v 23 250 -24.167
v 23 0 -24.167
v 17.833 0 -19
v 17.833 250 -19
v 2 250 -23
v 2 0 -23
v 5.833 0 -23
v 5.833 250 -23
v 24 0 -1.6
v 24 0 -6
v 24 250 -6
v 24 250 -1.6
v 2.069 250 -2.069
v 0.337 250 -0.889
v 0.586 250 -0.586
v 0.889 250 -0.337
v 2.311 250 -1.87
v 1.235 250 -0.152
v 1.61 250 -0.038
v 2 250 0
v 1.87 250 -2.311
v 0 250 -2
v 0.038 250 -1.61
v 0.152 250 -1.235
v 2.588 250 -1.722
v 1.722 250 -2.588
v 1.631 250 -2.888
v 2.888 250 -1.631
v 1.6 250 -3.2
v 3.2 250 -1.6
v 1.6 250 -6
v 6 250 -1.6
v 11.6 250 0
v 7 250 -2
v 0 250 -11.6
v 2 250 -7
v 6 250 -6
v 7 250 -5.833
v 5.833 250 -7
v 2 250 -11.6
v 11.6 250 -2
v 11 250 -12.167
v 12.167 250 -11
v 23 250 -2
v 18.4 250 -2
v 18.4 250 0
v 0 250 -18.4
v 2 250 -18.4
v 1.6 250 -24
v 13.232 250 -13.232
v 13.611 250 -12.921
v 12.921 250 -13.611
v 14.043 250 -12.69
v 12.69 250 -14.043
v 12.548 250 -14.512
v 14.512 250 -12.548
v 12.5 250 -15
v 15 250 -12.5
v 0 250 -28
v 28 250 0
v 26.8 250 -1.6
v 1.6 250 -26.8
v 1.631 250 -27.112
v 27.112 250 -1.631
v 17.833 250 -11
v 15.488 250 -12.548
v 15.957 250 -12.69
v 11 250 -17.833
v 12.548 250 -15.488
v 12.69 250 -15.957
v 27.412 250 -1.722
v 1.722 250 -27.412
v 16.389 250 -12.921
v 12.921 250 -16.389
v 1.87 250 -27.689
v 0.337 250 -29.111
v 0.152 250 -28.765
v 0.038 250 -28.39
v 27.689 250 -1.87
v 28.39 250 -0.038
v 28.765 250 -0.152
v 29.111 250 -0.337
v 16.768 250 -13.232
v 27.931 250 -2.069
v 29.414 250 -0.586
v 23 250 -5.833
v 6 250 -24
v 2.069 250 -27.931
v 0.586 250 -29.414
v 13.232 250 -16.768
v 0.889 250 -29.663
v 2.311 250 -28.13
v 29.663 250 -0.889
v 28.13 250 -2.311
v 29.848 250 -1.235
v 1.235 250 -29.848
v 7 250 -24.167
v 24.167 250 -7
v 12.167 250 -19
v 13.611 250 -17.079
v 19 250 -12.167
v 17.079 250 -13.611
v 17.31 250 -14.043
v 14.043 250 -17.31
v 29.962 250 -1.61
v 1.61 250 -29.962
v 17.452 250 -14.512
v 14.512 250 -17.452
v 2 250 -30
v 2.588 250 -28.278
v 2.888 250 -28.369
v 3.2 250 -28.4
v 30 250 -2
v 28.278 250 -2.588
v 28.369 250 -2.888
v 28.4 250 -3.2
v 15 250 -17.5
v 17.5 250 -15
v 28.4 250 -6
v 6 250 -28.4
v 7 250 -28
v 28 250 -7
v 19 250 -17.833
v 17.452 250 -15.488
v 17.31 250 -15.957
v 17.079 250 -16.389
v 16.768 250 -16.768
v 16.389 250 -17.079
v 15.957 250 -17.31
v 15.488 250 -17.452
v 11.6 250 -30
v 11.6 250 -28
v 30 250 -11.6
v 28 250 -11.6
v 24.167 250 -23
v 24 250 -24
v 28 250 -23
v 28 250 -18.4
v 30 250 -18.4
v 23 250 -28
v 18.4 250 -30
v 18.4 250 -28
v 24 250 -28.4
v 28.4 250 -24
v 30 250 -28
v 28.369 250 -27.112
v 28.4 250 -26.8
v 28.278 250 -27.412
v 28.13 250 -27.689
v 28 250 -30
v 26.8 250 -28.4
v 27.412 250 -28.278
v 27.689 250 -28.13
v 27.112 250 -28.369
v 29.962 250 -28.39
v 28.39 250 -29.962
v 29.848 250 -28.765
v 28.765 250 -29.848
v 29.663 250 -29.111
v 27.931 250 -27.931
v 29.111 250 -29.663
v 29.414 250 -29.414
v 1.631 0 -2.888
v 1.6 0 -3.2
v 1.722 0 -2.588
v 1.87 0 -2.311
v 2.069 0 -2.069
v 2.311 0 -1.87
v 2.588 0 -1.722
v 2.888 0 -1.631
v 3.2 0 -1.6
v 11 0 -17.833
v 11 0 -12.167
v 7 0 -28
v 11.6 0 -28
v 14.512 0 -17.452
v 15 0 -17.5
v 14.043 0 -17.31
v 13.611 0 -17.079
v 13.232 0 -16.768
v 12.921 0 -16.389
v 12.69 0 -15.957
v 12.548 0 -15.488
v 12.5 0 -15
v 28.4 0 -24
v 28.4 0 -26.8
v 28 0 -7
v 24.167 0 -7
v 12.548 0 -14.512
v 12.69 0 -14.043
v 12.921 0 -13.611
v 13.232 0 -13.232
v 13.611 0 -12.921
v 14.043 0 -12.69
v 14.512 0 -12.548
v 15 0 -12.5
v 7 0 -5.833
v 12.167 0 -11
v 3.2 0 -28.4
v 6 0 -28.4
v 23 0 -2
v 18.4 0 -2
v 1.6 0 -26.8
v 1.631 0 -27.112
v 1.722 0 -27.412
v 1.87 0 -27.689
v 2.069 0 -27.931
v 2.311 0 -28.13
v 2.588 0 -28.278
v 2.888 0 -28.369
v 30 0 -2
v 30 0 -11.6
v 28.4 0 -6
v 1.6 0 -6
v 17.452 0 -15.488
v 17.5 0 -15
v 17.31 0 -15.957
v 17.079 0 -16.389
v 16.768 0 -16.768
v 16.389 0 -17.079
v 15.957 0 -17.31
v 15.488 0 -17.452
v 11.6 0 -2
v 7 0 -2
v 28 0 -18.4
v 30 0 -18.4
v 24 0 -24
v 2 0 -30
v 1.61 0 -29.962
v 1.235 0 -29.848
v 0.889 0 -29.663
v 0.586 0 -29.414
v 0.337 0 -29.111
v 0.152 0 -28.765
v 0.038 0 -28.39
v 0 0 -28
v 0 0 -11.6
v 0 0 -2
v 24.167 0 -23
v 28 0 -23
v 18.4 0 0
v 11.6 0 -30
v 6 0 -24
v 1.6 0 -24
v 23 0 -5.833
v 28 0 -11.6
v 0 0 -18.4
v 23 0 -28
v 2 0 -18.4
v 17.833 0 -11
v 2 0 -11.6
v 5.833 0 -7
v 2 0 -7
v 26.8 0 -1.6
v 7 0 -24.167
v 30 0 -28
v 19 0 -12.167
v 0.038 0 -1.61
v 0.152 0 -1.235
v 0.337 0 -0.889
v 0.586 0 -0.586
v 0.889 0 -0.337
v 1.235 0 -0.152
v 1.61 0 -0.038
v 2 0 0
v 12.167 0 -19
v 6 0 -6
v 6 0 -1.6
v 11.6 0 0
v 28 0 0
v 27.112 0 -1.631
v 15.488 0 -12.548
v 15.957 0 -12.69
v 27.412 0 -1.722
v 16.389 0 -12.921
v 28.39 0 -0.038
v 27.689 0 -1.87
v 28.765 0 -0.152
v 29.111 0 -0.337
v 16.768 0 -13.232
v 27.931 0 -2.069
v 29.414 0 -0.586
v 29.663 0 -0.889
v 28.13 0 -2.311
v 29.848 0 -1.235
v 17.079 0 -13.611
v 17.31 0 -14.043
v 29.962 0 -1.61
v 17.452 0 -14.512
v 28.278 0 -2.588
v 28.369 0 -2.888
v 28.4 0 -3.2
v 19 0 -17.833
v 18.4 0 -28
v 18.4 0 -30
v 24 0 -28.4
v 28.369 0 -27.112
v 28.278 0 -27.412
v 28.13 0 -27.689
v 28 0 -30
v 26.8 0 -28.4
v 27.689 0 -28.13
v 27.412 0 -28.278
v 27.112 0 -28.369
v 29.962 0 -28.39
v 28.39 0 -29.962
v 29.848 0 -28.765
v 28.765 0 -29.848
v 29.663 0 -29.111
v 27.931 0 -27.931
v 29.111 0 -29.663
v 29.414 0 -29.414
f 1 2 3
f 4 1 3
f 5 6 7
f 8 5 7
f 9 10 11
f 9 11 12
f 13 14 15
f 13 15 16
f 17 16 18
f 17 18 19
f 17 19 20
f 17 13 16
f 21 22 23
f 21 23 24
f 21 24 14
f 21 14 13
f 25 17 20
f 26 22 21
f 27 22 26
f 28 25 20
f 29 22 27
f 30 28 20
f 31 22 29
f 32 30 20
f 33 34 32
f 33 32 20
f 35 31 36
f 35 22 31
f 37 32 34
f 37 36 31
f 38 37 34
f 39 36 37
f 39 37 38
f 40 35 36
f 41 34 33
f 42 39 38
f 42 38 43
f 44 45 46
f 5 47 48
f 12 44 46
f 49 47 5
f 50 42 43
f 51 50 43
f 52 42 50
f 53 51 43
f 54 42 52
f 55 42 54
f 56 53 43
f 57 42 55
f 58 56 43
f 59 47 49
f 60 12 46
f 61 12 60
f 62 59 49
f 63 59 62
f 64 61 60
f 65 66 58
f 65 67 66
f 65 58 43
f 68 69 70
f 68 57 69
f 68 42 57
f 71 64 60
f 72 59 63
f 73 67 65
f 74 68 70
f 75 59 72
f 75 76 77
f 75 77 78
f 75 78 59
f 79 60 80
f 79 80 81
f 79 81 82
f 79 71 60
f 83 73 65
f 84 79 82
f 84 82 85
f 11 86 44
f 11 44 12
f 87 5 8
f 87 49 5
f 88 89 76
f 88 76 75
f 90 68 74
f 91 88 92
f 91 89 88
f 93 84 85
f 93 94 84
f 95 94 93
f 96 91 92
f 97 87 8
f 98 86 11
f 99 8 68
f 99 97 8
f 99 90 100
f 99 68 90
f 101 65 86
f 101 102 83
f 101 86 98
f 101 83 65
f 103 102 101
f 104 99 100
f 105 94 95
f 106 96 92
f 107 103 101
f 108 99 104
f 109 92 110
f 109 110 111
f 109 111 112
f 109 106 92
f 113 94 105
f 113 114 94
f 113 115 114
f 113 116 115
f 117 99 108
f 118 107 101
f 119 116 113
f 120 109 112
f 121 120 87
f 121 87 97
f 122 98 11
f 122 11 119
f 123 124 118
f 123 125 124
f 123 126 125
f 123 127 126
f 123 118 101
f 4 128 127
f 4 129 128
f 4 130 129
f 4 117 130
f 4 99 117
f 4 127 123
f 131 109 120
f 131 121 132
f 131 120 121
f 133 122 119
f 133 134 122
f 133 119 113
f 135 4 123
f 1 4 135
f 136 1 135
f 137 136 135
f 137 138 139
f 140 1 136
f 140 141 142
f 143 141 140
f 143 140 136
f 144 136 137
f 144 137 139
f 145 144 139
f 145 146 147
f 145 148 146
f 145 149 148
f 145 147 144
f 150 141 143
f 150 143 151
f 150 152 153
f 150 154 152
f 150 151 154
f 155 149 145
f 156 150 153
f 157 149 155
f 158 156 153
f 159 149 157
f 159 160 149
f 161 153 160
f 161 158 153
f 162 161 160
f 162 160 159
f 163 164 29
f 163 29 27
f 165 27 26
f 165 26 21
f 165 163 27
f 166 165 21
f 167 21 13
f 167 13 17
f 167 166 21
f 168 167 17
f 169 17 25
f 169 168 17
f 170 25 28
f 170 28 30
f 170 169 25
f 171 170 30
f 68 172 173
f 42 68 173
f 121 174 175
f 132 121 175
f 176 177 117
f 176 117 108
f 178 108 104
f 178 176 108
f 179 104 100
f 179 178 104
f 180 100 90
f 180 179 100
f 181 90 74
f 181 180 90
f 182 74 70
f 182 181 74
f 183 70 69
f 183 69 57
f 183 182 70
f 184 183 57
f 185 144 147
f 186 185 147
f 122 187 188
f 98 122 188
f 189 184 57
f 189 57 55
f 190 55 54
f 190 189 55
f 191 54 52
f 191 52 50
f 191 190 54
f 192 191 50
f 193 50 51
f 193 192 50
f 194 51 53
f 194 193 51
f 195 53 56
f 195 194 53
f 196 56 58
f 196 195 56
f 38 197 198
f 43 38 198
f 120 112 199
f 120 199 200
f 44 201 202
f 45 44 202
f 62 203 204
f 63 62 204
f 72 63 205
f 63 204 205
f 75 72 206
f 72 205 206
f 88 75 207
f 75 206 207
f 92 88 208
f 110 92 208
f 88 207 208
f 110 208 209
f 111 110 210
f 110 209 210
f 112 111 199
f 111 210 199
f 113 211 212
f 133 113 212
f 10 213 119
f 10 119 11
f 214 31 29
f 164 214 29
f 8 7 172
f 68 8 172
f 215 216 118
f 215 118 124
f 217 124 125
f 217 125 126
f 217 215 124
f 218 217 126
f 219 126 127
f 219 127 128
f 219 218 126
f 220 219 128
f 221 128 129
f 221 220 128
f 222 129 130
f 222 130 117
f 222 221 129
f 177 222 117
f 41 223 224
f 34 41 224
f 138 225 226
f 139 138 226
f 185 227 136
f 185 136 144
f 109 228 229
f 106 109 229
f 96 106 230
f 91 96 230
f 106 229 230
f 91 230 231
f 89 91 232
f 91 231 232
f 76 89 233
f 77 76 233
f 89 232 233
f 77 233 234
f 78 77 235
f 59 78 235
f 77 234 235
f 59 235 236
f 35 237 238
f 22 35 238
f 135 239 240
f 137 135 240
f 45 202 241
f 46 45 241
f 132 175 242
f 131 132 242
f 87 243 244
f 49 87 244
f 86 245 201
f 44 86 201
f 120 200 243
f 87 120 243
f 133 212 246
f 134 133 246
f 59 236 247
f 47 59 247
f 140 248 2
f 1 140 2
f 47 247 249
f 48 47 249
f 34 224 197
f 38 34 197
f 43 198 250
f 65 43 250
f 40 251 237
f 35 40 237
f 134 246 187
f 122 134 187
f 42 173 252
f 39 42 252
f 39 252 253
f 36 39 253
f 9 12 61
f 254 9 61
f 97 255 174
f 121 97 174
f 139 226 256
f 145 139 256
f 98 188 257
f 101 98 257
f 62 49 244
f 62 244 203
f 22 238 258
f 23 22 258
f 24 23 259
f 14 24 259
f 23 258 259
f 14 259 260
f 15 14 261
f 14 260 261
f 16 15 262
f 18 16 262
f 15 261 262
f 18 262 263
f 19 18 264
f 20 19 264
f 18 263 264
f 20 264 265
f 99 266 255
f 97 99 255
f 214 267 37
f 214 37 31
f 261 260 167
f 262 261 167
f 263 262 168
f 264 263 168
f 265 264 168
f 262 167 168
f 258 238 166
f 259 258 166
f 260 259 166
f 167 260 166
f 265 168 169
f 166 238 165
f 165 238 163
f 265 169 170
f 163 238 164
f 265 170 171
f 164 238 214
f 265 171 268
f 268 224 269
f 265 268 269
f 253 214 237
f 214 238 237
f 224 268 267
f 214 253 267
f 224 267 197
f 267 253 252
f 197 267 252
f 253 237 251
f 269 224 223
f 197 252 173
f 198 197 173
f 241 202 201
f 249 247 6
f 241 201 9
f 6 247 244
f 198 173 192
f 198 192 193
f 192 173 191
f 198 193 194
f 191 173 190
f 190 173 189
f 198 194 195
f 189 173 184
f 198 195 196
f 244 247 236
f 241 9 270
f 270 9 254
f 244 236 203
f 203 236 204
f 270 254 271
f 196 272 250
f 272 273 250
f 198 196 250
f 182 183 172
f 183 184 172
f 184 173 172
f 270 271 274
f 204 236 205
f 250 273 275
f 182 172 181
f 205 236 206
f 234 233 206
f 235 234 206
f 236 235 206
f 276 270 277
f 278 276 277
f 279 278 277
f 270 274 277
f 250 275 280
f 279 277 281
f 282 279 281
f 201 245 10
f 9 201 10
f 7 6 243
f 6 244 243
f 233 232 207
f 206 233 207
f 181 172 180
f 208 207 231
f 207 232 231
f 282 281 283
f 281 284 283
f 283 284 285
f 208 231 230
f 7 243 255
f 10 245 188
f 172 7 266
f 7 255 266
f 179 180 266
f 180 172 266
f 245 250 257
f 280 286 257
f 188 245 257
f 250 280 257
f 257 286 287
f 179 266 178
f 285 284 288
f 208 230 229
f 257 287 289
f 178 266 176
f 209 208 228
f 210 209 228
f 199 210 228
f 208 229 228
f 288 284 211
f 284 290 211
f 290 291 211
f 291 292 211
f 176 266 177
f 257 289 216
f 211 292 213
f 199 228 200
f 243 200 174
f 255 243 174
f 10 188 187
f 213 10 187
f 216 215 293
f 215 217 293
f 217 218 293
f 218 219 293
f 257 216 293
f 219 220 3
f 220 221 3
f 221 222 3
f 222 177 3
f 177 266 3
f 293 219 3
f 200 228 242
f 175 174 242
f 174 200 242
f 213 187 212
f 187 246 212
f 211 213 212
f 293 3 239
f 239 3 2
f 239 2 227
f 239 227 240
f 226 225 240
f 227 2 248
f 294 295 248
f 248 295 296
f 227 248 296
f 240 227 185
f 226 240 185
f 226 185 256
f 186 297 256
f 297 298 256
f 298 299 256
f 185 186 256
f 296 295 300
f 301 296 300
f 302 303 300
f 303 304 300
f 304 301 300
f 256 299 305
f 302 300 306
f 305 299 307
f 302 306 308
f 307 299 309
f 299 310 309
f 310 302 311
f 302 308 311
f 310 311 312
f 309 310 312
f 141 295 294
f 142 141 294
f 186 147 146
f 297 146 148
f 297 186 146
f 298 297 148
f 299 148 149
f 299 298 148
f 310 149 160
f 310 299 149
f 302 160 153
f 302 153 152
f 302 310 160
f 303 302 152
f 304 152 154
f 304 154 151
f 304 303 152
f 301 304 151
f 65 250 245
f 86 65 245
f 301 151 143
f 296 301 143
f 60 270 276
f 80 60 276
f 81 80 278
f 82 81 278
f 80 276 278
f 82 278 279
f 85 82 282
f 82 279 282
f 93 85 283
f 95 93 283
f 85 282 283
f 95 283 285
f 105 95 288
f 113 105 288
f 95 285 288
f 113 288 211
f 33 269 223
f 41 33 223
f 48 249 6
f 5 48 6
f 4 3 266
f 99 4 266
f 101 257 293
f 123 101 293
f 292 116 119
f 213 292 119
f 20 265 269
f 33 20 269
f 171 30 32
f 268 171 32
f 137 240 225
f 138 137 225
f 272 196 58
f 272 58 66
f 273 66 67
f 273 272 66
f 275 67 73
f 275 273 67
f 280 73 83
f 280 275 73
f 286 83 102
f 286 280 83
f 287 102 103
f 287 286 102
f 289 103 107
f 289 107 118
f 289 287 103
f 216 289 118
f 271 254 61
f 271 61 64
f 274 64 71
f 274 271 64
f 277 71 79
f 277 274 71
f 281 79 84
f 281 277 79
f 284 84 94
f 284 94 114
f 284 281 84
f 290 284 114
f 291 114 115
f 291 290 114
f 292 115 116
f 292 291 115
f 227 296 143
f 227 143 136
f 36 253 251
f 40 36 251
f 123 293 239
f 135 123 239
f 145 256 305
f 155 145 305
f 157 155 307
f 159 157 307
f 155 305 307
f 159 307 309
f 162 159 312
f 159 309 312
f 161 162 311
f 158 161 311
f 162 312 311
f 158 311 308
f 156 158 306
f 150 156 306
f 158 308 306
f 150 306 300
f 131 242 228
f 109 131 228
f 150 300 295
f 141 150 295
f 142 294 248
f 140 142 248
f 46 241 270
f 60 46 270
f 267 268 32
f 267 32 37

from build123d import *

# Parameters (mm, degrees)
BOSS_EXTRUDE1_DEPTH = 250


with BuildPart() as part:
    # Sketch1 → Boss-Extrude1 (new body)
    with BuildSketch(Plane(origin=(0, 0, 0), x_dir=(1, 0, 0), z_dir=(0, 1, 0))):
        with BuildLine():
            Line((0, 28), (0, 18.4))
            Line((0, 18.4), (2, 18.4))
            Line((2, 18.4), (2, 23))
            Line((2, 23), (5.833273811, 23))
            Line((5.833273811, 23), (11, 17.833273811))
            Line((11, 17.833273811), (11, 15))
            Line((11, 15), (11, 12.166726189))
            Line((11, 12.166726189), (5.833273811, 7))
            Line((5.833273811, 7), (2, 7))
            Line((2, 7), (2, 11.6))
            Line((2, 11.6), (0, 11.6))
            Line((0, 11.6), (0, 2))
            ThreePointArc((0, 2), (0.585786438, 0.585786438), (2, 0))
            Line((2, 0), (11.6, 0))
            Line((11.6, 0), (11.6, 2))
            Line((11.6, 2), (7, 2))
            Line((7, 2), (7, 5.833273811))
            Line((7, 5.833273811), (12.166726189, 11))
            Line((12.166726189, 11), (15, 11))
            Line((15, 11), (17.833273811, 11))
            Line((17.833273811, 11), (23, 5.833273811))
            Line((23, 5.833273811), (23, 2))
            Line((23, 2), (18.4, 2))
            Line((18.4, 2), (18.4, 0))
            Line((18.4, 0), (28, 0))
            ThreePointArc((28, 0), (29.414213562, 0.585786438), (30, 2))
            Line((30, 2), (30, 11.6))
            Line((30, 11.6), (28, 11.6))
            Line((28, 11.6), (28, 7))
            Line((28, 7), (24.166726189, 7))
            Line((24.166726189, 7), (19, 12.166726189))
            Line((19, 12.166726189), (19, 15))
            Line((19, 15), (19, 17.833273811))
            Line((19, 17.833273811), (24.166726189, 23))
            Line((24.166726189, 23), (28, 23))
            Line((28, 23), (28, 18.4))
            Line((28, 18.4), (30, 18.4))
            Line((30, 18.4), (30, 28))
            ThreePointArc((30, 28), (29.414213562, 29.414213562), (28, 30))
            Line((28, 30), (18.4, 30))
            Line((18.4, 30), (18.4, 28))
            Line((18.4, 28), (23, 28))
            Line((23, 28), (23, 24.166726189))
            Line((23, 24.166726189), (17.833273811, 19))
            Line((17.833273811, 19), (15, 19))
            Line((15, 19), (12.166726189, 19))
            Line((12.166726189, 19), (7, 24.166726189))
            Line((7, 24.166726189), (7, 28))
            Line((7, 28), (11.6, 28))
            Line((11.6, 28), (11.6, 30))
            Line((11.6, 30), (2, 30))
            ThreePointArc((2, 30), (0.585786438, 29.414213562), (0, 28))
        make_face()
        with BuildLine():
            Line((6, 28.4), (6, 24))
            Line((6, 24), (1.6, 24))
            Line((1.6, 24), (1.6, 26.8))
            ThreePointArc((1.6, 26.8), (2.06862915, 27.93137085), (3.2, 28.4))
            Line((3.2, 28.4), (6, 28.4))
        make_face(mode=Mode.SUBTRACT)
        with BuildLine():
            Line((26.8, 28.4), (24, 28.4))
            Line((24, 28.4), (24, 24))
            Line((24, 24), (28.4, 24))
            Line((28.4, 24), (28.4, 26.8))
            ThreePointArc((28.4, 26.8), (27.93137085, 27.93137085), (26.8, 28.4))
        make_face(mode=Mode.SUBTRACT)
        with BuildLine():
            Line((28.4, 3.2), (28.4, 6))
            Line((28.4, 6), (24, 6))
            Line((24, 6), (24, 1.6))
            Line((24, 1.6), (26.8, 1.6))
            ThreePointArc((26.8, 1.6), (27.93137085, 2.06862915), (28.4, 3.2))
        make_face(mode=Mode.SUBTRACT)
        with BuildLine():
            Line((3.2, 1.6), (6, 1.6))
            Line((6, 1.6), (6, 6))
            Line((6, 6), (1.6, 6))
            Line((1.6, 6), (1.6, 3.2))
            ThreePointArc((1.6, 3.2), (2.06862915, 2.06862915), (3.2, 1.6))
        make_face(mode=Mode.SUBTRACT)
        with BuildLine():
            ThreePointArc((15, 17.5), (13.232233047, 16.767766953), (12.5, 15))
            ThreePointArc((12.5, 15), (13.232233047, 13.232233047), (15, 12.5))
            ThreePointArc((15, 12.5), (16.767766953, 13.232233047), (17.5, 15))
            ThreePointArc((17.5, 15), (16.767766953, 16.767766953), (15, 17.5))
        make_face(mode=Mode.SUBTRACT)
    extrude(amount=BOSS_EXTRUDE1_DEPTH)


solid = part.part
